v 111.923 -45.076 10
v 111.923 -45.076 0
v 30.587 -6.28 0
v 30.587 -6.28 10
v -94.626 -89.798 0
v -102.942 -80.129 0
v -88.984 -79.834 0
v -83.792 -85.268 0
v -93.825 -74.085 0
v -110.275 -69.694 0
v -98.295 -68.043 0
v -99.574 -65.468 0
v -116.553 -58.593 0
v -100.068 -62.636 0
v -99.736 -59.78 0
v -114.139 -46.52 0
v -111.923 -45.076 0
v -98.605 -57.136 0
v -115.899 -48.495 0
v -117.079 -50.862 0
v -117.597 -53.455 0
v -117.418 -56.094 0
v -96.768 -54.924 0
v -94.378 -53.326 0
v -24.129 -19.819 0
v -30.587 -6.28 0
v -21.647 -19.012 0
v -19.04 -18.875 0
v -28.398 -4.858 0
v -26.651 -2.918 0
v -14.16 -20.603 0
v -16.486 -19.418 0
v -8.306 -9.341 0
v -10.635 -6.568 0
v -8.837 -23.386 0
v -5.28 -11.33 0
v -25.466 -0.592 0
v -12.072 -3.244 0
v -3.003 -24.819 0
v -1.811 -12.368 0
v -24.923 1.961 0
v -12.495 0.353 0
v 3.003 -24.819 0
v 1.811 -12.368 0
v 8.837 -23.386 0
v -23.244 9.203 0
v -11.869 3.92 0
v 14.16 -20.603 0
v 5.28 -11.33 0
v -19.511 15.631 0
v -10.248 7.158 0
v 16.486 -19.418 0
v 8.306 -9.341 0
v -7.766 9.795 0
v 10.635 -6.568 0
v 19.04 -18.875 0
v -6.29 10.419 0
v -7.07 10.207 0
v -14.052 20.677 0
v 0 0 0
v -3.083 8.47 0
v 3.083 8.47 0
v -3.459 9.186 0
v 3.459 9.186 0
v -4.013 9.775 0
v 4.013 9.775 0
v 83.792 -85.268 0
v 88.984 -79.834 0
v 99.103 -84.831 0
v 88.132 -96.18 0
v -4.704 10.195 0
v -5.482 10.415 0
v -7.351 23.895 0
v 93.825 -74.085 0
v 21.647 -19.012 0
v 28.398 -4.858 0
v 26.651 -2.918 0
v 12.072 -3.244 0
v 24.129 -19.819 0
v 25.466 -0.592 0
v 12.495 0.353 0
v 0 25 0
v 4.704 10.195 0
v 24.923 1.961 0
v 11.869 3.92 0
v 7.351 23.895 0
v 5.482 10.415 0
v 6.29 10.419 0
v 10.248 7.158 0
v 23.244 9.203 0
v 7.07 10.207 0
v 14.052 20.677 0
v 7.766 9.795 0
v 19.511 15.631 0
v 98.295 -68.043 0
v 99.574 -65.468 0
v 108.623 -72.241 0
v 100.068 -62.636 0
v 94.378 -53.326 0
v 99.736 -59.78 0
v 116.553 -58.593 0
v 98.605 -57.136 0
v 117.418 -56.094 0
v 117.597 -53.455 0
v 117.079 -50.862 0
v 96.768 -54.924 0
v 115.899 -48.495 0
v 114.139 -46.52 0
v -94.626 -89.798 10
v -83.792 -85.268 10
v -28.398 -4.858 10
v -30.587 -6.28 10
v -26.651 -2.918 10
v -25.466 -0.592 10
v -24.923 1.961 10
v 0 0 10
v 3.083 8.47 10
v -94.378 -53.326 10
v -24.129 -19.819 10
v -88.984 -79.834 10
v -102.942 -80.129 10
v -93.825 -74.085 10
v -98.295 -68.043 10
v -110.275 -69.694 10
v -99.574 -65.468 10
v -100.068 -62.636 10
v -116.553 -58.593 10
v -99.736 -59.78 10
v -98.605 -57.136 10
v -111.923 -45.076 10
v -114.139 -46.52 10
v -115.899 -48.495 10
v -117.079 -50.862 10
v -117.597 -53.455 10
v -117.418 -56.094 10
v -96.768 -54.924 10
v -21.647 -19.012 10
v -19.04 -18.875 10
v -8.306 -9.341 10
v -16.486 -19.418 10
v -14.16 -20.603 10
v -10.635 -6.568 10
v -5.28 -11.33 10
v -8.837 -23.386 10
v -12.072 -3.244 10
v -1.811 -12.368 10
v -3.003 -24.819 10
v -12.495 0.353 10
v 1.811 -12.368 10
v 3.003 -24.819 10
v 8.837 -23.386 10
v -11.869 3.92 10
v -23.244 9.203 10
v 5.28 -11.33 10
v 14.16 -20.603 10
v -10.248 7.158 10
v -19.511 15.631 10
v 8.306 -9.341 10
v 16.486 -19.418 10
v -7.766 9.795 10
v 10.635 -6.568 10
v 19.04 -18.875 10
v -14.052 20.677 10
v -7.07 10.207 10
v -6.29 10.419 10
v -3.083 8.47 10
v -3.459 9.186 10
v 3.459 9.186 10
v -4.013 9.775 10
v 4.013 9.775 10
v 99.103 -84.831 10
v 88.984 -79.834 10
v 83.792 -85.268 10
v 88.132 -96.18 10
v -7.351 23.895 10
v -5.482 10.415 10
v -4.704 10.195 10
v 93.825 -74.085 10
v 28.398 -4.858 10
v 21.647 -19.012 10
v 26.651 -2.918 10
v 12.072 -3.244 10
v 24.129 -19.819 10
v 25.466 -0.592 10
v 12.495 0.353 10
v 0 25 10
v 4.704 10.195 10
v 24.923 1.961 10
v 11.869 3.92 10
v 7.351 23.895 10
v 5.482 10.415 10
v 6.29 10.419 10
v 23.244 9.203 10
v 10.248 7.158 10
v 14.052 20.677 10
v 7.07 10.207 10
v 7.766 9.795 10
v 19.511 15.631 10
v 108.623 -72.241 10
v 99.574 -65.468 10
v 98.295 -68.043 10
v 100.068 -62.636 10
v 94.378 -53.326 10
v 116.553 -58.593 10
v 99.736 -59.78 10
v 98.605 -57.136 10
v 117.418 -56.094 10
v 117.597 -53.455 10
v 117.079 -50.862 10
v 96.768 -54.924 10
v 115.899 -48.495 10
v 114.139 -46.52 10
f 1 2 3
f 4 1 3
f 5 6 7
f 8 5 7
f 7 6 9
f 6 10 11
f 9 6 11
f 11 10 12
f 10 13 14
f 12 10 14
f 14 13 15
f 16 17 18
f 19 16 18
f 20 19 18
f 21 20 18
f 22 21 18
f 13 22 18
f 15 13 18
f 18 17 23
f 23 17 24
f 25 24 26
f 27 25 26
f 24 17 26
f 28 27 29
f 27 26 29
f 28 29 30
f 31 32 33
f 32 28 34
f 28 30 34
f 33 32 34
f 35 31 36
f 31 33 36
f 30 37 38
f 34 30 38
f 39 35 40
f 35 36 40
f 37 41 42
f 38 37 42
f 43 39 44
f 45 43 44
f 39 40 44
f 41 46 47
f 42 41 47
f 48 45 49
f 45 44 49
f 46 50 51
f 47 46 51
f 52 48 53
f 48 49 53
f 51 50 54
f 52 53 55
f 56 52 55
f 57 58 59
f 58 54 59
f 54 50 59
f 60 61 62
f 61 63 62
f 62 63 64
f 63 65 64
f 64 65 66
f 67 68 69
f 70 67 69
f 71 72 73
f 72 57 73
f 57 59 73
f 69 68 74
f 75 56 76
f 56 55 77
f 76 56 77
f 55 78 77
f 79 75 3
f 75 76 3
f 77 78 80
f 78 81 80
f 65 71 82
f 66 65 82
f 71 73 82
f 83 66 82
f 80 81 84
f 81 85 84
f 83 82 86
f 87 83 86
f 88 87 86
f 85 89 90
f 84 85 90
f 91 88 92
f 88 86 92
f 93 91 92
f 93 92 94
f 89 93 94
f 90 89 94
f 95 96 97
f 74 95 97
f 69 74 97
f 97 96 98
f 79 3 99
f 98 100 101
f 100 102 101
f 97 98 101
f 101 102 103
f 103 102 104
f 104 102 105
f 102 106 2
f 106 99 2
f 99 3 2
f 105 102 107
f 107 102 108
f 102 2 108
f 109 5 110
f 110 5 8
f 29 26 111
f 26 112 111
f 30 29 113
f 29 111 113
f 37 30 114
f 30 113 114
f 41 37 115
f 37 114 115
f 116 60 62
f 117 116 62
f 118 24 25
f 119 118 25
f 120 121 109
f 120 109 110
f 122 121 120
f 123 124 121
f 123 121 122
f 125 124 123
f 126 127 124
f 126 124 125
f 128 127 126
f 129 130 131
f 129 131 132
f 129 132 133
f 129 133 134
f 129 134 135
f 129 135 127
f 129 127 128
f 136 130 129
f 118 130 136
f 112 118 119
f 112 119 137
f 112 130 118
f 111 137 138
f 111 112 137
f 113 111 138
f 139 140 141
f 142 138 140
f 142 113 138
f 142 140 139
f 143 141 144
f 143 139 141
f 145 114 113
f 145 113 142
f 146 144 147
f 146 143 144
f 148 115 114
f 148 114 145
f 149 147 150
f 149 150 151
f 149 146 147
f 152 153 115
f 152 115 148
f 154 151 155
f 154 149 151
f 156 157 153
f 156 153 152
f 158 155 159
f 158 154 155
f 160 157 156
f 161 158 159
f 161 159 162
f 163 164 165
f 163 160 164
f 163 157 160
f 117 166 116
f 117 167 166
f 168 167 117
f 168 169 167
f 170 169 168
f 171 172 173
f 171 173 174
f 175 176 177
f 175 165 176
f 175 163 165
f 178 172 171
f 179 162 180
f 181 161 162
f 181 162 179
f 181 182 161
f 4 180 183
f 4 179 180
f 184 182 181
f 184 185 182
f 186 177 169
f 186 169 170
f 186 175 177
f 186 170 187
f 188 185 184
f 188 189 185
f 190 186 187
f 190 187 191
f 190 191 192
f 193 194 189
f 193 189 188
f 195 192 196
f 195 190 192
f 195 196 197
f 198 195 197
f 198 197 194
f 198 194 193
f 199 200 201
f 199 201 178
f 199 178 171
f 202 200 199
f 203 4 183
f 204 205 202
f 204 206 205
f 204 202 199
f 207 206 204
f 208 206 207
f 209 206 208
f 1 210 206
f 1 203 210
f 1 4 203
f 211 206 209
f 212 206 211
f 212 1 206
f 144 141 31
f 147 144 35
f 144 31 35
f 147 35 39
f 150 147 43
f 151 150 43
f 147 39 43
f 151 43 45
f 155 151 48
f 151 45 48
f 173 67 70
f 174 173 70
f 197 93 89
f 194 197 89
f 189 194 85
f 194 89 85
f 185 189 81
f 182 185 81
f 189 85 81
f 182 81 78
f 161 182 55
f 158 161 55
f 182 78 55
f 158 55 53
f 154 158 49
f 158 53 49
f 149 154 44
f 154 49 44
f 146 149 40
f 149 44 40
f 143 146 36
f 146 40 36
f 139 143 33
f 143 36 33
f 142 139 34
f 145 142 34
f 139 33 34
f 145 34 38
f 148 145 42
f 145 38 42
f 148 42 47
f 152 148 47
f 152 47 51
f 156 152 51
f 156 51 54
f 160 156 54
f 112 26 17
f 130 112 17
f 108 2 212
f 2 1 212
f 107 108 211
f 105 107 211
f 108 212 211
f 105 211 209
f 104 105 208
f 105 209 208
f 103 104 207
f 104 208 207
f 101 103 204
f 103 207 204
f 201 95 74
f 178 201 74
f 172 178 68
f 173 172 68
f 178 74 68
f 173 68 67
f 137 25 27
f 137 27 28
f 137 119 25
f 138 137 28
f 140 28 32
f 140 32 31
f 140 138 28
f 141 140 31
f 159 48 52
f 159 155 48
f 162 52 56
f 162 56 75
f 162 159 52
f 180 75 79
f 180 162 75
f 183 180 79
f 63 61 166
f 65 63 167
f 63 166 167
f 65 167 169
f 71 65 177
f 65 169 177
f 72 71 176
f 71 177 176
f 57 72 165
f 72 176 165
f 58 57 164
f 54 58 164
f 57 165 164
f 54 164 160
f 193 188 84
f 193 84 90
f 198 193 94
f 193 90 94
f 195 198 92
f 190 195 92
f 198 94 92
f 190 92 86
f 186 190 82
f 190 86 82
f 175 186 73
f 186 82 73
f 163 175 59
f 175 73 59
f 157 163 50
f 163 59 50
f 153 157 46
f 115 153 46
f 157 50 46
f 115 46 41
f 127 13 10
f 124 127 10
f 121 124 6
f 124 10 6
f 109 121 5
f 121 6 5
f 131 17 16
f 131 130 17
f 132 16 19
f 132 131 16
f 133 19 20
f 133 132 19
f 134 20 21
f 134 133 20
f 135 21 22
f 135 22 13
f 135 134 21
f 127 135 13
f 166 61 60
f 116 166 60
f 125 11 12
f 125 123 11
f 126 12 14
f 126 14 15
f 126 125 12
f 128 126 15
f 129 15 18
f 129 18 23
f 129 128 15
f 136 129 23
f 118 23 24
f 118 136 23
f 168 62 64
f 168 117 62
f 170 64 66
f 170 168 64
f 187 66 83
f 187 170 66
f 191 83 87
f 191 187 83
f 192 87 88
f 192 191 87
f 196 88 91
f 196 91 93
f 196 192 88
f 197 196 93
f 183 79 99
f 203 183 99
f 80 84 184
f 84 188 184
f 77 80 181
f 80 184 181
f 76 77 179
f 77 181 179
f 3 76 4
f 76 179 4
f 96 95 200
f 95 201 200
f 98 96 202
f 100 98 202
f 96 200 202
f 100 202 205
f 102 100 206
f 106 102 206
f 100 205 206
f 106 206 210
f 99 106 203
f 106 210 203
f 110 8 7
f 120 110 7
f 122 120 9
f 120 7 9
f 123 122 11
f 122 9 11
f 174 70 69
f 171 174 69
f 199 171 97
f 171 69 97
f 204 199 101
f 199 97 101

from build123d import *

# Parameters (mm, degrees)
BOSS_EXTRUDE1_DEPTH = 10
FILLET1_R           = 10
FILLET2_R           = 10
FILLET3_R           = 3


with BuildPart() as part:
    # Sketch1 → Boss-Extrude1 (new body)
    with BuildSketch(Plane.XY):
        with BuildLine():
            Line((-94.626197475, -89.797589363), (-83.792, -85.26796022))
            ThreePointArc((-83.792, -85.26796022), (-95.098975753, -72.442453815), (-104.460674711, -58.135116263))
            Line((-104.460674711, -58.135116263), (-18.296393823, -17.036489459))
            ThreePointArc((-18.296393823, -17.036489459), (0, -25), (18.296393823, -17.036489459))
            Line((18.296393823, -17.036489459), (104.460674711, -58.135116263))
            ThreePointArc((104.460674711, -58.135116263), (95.098975753, -72.442453815), (83.792, -85.26796022))
            Line((83.792, -85.26796022), (88.131779474, -96.179591135))
            ThreePointArc((88.131779474, -96.179591135), (107.052618298, -74.548381737), (120.777959535, -49.299176408))
            Line((120.777959535, -49.299176408), (24.754108024, -3.497732969))
            ThreePointArc((24.754108024, -3.497732969), (0, 25), (-24.754108024, -3.497732969))
            Line((-24.754108024, -3.497732969), (-120.777959535, -49.299176408))
            ThreePointArc((-120.777959535, -49.299176408), (-109.589087401, -70.766914774), (-94.626197475, -89.797589363))
        make_face()
        with BuildLine():
            ThreePointArc((4.275251792, 11.74615776), (0, -12.5), (-4.275251792, 11.74615776))
            Line((-4.275251792, 11.74615776), (0, 0))
            Line((0, 0), (4.275251792, 11.74615776))
        make_face(mode=Mode.SUBTRACT)
    extrude(amount=BOSS_EXTRUDE1_DEPTH)

    # Fillet1
    fillet1_edges = [part.edges().sort_by_distance(p)[0] for p in [
        (-24.754108024, -3.497732969, 5),
        (24.754108024, -3.497732969, 5),
        (18.296393823, -17.036489459, 5),
        (-18.296393823, -17.036489459, 5),
    ]]
    fillet(fillet1_edges, radius=FILLET1_R)

    # Fillet2
    fillet2_edges = [part.edges().sort_by_distance(p)[0] for p in [
        (-104.460674711, -58.135116263, 5),
        (-120.777959535, -49.299176408, 5),
        (120.777959535, -49.299176408, 5),
        (104.460674711, -58.135116263, 5),
    ]]
    fillet(fillet2_edges, radius=FILLET2_R)

    # Fillet3
    fillet3_edges = [part.edges().sort_by_distance(p)[0] for p in [
        (4.275251792, 11.74615776, 5),
        (-4.275251792, 11.74615776, 5),
    ]]
    fillet(fillet3_edges, radius=FILLET3_R)


solid = part.part
